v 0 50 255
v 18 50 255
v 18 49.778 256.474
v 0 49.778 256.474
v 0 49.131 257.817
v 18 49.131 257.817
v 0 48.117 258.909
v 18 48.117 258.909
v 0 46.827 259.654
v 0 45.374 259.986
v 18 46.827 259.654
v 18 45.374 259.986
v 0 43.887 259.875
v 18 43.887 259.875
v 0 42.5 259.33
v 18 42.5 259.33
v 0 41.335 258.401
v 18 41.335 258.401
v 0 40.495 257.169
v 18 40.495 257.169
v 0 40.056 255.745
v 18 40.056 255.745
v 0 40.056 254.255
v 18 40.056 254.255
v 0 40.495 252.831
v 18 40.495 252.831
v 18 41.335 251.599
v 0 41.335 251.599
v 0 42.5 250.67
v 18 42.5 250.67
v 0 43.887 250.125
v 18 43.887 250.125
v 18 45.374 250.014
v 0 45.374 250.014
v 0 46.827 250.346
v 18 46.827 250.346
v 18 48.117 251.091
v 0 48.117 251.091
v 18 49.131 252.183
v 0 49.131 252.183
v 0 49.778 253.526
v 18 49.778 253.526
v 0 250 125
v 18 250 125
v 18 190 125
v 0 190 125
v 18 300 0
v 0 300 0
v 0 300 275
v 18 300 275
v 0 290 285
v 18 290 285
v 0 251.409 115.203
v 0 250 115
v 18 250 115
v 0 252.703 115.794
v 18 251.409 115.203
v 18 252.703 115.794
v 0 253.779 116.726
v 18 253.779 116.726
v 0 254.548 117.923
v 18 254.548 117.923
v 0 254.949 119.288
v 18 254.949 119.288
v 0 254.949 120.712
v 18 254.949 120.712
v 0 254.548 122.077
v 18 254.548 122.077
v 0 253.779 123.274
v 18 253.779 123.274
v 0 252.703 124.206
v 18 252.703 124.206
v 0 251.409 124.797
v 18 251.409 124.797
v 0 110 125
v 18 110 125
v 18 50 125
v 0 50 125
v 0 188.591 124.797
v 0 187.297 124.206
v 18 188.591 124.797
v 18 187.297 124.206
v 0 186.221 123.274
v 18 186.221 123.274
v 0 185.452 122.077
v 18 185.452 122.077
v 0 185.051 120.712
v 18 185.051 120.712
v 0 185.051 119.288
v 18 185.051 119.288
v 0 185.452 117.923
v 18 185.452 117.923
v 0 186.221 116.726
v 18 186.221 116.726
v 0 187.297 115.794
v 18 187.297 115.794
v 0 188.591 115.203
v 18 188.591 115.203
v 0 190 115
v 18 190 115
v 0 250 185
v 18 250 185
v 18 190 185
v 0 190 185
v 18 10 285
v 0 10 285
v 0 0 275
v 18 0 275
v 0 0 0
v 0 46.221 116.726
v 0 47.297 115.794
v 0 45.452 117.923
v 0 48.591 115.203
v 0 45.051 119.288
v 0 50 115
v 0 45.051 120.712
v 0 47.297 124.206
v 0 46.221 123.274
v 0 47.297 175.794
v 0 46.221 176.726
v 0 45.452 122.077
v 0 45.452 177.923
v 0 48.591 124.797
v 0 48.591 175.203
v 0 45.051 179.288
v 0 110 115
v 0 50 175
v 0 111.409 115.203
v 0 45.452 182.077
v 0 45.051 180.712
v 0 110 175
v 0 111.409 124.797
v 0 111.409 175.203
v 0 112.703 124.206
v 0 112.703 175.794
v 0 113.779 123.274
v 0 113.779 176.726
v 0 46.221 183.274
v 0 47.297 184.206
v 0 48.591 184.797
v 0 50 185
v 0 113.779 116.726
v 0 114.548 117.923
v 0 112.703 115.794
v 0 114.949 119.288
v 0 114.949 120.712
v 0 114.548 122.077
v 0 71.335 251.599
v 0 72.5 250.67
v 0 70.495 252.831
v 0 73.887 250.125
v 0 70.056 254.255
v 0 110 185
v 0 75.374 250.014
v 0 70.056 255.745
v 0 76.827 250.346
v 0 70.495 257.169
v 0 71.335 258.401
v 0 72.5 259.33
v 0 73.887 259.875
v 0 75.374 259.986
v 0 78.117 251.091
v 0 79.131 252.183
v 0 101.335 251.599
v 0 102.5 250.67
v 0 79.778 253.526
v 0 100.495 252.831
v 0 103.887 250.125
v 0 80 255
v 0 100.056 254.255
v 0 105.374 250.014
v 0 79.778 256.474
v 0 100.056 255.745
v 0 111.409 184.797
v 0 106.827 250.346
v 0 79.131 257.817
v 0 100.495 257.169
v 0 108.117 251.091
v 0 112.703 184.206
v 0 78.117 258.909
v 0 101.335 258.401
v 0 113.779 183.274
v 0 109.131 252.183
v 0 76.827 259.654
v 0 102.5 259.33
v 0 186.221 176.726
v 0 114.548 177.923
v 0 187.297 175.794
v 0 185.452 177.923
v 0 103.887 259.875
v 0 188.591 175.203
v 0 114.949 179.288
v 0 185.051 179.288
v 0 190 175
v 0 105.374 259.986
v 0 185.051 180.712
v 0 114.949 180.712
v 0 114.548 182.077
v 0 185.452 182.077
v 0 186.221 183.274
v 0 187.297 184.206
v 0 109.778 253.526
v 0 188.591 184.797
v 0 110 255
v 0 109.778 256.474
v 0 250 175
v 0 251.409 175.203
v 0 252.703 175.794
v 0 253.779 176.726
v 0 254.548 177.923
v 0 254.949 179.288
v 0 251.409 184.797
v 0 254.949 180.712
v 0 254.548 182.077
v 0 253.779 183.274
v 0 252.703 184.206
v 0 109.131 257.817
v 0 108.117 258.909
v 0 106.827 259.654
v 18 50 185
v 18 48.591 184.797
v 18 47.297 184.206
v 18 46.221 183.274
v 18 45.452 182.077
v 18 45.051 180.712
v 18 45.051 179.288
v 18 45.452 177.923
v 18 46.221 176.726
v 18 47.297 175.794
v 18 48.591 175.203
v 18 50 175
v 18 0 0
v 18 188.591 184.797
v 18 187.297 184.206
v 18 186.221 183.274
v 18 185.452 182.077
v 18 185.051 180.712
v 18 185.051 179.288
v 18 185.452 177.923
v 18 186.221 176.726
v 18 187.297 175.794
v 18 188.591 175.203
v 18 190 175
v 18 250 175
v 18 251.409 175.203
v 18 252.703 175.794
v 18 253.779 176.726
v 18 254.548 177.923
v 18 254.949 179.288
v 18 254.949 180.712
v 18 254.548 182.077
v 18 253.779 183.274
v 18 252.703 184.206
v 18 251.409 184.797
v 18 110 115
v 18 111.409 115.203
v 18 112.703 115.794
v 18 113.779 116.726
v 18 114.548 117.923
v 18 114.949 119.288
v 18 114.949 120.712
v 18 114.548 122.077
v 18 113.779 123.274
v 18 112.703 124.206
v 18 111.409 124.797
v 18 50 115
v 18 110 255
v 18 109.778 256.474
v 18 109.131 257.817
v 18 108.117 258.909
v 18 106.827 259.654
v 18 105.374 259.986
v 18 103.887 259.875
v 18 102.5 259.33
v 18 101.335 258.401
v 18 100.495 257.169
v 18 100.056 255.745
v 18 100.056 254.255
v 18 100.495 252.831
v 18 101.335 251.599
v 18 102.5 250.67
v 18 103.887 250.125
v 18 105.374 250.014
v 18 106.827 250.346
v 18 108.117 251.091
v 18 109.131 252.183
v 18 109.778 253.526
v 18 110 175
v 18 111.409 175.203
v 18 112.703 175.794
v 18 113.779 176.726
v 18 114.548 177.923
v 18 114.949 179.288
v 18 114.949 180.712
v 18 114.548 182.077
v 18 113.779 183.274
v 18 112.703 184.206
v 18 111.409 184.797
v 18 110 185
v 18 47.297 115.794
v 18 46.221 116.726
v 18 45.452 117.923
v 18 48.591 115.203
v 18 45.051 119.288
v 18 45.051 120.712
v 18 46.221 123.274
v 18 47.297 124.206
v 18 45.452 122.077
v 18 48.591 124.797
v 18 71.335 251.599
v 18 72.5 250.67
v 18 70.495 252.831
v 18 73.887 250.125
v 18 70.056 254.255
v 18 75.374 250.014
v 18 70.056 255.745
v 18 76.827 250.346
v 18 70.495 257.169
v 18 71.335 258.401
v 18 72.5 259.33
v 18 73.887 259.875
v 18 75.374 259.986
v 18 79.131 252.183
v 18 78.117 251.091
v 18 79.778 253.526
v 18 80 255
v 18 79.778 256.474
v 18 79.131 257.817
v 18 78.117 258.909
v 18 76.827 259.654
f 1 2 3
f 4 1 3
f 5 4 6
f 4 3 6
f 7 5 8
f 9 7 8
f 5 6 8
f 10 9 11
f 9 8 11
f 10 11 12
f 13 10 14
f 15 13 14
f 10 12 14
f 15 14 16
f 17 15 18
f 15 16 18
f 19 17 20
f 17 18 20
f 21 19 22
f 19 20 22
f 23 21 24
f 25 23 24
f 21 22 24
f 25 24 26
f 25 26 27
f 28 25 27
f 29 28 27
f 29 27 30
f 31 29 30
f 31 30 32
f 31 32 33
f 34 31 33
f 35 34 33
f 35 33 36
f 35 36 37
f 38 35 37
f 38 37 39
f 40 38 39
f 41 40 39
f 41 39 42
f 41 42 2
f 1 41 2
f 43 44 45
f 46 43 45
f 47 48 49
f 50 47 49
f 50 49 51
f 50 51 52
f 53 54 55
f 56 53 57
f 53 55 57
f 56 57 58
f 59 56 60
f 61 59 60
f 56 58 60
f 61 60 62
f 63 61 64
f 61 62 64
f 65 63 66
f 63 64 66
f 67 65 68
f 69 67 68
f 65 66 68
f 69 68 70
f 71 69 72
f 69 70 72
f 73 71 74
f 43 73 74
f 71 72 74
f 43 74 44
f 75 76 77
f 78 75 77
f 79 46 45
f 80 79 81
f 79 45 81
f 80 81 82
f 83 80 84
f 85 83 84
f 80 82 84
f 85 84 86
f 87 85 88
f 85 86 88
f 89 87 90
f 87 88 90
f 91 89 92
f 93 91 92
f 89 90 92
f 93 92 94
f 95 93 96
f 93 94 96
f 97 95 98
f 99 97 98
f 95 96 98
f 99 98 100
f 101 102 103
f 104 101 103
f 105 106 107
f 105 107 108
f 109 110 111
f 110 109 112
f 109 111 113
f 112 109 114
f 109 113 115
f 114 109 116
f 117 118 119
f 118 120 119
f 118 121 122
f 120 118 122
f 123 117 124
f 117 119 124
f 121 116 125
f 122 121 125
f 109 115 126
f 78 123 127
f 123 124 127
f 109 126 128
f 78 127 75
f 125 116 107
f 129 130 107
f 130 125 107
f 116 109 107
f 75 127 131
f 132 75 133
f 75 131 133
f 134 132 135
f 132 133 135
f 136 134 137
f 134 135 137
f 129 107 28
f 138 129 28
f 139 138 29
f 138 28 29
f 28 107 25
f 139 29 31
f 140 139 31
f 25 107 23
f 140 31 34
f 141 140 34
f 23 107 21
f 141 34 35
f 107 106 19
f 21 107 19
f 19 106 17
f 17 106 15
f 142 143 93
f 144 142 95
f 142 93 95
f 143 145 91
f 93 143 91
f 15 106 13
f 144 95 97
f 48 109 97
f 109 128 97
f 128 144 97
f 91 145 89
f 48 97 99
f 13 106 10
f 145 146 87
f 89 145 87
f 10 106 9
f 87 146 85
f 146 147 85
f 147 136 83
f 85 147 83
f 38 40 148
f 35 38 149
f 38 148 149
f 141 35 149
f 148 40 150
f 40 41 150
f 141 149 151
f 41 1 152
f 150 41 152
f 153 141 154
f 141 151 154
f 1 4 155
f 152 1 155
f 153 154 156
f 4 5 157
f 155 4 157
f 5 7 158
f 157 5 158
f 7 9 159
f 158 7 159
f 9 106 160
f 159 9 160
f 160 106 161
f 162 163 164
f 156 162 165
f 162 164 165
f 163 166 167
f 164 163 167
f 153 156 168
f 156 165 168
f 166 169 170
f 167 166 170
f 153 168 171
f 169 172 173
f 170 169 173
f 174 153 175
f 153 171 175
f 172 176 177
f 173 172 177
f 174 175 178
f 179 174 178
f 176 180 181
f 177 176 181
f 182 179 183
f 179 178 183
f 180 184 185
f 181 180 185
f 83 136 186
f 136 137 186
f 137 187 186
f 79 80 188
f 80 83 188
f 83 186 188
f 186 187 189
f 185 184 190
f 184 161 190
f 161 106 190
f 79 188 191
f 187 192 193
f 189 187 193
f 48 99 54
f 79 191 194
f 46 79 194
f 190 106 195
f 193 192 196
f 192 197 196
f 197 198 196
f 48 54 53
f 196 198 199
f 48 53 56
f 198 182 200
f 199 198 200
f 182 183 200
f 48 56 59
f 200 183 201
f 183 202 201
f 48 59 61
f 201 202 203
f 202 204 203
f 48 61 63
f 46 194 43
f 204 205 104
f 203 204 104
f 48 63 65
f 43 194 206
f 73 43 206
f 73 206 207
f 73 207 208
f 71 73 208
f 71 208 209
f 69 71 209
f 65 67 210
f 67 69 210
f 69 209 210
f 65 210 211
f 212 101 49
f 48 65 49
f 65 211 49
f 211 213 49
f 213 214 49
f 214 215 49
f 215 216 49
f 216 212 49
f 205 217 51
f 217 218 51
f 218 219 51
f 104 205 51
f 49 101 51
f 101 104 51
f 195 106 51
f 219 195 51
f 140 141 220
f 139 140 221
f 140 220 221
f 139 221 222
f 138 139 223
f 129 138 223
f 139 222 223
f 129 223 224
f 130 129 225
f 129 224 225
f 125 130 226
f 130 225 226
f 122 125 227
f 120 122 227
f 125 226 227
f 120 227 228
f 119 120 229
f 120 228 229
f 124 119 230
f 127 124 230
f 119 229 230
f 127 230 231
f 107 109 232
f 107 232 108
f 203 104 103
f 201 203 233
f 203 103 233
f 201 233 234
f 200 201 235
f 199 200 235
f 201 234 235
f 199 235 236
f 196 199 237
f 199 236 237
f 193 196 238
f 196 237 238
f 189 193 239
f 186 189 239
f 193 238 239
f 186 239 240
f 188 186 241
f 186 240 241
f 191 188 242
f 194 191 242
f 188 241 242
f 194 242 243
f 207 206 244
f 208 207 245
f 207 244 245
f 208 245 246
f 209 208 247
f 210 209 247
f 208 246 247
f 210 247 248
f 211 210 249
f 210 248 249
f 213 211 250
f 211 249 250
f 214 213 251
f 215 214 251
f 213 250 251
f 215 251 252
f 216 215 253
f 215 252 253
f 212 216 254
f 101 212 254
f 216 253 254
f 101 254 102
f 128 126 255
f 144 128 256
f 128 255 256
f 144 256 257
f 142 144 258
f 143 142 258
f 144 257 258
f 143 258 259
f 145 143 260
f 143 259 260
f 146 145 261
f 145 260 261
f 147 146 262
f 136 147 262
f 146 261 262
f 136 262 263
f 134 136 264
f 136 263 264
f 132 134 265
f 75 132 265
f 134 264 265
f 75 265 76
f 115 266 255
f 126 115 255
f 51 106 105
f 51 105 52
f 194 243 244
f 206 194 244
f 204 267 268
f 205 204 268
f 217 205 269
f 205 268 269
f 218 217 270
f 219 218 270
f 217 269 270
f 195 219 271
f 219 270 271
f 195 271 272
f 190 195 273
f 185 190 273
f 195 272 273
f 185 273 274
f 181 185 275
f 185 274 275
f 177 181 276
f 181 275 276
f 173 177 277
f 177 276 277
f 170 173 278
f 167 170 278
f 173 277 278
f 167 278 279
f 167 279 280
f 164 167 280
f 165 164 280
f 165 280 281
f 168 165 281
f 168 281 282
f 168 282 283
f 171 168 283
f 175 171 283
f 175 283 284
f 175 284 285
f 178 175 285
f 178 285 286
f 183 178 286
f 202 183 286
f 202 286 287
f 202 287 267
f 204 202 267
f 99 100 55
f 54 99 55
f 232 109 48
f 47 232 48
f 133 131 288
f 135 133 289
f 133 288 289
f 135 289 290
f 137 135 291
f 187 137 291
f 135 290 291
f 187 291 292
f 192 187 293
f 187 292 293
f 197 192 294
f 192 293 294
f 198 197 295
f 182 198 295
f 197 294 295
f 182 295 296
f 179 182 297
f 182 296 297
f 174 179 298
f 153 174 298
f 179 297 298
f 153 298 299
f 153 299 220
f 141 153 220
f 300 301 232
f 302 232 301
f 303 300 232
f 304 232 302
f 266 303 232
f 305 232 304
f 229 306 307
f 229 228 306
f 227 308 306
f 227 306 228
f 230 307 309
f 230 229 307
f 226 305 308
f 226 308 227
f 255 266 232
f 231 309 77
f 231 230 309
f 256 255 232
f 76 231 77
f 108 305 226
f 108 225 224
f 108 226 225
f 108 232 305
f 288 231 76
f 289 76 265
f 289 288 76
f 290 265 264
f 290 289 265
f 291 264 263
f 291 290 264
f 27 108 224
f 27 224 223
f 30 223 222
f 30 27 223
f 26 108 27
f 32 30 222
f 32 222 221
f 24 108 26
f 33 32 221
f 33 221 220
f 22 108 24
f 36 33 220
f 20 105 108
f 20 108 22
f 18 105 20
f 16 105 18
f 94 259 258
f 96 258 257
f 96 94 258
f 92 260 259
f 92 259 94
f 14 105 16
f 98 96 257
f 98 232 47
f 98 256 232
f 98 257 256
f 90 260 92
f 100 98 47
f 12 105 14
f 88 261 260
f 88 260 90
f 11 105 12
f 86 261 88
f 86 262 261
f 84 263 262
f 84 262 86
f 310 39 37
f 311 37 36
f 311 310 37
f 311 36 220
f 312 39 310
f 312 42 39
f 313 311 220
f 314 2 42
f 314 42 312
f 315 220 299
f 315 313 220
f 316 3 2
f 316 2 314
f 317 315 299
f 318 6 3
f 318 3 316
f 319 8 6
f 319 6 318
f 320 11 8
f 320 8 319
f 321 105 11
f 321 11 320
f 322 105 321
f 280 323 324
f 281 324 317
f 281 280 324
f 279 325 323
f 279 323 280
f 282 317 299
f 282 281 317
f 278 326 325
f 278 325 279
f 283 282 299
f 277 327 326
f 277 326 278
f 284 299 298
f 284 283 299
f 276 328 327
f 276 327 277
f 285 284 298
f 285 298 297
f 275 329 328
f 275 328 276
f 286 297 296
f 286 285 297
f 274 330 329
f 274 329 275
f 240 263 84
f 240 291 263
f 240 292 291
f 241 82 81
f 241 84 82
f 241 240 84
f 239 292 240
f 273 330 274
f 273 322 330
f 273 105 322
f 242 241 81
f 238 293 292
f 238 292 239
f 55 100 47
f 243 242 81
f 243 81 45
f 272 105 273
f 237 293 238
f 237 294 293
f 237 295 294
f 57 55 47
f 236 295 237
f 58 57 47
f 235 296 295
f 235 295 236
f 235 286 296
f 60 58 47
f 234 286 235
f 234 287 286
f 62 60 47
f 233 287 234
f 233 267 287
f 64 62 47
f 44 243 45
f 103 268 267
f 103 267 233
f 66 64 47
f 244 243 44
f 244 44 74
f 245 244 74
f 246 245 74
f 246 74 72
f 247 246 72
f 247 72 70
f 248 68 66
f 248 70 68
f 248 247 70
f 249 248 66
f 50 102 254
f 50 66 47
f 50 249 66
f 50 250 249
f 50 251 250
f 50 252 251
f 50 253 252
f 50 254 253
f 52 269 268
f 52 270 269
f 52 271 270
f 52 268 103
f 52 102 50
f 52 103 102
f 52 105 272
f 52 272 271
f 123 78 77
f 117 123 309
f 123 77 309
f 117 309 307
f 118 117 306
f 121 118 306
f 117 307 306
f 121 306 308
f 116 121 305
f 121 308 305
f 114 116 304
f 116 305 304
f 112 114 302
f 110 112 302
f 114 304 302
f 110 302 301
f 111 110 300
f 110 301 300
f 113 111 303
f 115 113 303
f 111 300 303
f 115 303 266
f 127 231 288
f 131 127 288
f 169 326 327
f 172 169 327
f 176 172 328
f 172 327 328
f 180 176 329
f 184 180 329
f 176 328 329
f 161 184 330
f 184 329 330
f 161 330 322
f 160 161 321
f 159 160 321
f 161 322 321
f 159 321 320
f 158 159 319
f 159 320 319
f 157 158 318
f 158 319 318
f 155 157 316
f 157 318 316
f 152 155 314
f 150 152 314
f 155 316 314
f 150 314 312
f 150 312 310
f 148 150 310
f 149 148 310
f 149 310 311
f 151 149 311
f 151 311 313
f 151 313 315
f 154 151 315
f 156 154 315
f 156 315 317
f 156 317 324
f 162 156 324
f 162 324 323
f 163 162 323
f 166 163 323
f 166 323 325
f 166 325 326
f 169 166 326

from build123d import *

# Parameters (mm, degrees)
F0_W     = 300
F0_H     = 285
F1_DEPTH = 18
F2_R     = 5
F3_DEPTH = 18.001
F4_SIZE  = 10


with BuildPart() as f1:
    # F0 (on Right) → F1 (new body)
    with BuildSketch(Plane.YZ):
        with Locations((150, 142.5)):
            Rectangle(F0_W, F0_H)
    extrude(amount=F1_DEPTH)

    # F2 (on face) → F3 (cut, through all)
    with BuildSketch(Plane.YZ.offset(18)):
        with Locations((45, 255)):
            Circle(F2_R)
        with Locations((75, 255)):
            Circle(F2_R)
        with Locations((105, 255)):
            Circle(F2_R)
        with BuildLine():
            Line((80, 125), (50, 125))
            ThreePointArc((50, 125), (45, 120), (50, 115))
            Line((50, 115), (80, 115))
            Line((80, 115), (110, 115))
            ThreePointArc((110, 115), (115, 120), (110, 125))
            Line((110, 125), (80, 125))
        make_face()
        with BuildLine():
            ThreePointArc((50, 185), (45, 180), (50, 175))
            Line((50, 175), (80, 175))
            Line((80, 175), (110, 175))
            ThreePointArc((110, 175), (115, 180), (110, 185))
            Line((110, 185), (80, 185))
            Line((80, 185), (50, 185))
        make_face()
        with BuildLine():
            ThreePointArc((190, 185), (185, 180), (190, 175))
            Line((190, 175), (220, 175))
            Line((220, 175), (250, 175))
            ThreePointArc((250, 175), (255, 180), (250, 185))
            Line((250, 185), (220, 185))
            Line((220, 185), (190, 185))
        make_face()
        with BuildLine():
            ThreePointArc((190, 125), (185, 120), (190, 115))
            Line((190, 115), (220, 115))
            Line((220, 115), (250, 115))
            ThreePointArc((250, 115), (255, 120), (250, 125))
            Line((250, 125), (220, 125))
            Line((220, 125), (190, 125))
        make_face()
    extrude(amount=-F3_DEPTH, mode=Mode.SUBTRACT)

    # F4
    f4_edges = [f1.edges().sort_by_distance(p)[0] for p in [
        (9, 0, 285),
        (9, 300, 285),
    ]]
    chamfer(f4_edges, length=F4_SIZE)


solid = f1.part
